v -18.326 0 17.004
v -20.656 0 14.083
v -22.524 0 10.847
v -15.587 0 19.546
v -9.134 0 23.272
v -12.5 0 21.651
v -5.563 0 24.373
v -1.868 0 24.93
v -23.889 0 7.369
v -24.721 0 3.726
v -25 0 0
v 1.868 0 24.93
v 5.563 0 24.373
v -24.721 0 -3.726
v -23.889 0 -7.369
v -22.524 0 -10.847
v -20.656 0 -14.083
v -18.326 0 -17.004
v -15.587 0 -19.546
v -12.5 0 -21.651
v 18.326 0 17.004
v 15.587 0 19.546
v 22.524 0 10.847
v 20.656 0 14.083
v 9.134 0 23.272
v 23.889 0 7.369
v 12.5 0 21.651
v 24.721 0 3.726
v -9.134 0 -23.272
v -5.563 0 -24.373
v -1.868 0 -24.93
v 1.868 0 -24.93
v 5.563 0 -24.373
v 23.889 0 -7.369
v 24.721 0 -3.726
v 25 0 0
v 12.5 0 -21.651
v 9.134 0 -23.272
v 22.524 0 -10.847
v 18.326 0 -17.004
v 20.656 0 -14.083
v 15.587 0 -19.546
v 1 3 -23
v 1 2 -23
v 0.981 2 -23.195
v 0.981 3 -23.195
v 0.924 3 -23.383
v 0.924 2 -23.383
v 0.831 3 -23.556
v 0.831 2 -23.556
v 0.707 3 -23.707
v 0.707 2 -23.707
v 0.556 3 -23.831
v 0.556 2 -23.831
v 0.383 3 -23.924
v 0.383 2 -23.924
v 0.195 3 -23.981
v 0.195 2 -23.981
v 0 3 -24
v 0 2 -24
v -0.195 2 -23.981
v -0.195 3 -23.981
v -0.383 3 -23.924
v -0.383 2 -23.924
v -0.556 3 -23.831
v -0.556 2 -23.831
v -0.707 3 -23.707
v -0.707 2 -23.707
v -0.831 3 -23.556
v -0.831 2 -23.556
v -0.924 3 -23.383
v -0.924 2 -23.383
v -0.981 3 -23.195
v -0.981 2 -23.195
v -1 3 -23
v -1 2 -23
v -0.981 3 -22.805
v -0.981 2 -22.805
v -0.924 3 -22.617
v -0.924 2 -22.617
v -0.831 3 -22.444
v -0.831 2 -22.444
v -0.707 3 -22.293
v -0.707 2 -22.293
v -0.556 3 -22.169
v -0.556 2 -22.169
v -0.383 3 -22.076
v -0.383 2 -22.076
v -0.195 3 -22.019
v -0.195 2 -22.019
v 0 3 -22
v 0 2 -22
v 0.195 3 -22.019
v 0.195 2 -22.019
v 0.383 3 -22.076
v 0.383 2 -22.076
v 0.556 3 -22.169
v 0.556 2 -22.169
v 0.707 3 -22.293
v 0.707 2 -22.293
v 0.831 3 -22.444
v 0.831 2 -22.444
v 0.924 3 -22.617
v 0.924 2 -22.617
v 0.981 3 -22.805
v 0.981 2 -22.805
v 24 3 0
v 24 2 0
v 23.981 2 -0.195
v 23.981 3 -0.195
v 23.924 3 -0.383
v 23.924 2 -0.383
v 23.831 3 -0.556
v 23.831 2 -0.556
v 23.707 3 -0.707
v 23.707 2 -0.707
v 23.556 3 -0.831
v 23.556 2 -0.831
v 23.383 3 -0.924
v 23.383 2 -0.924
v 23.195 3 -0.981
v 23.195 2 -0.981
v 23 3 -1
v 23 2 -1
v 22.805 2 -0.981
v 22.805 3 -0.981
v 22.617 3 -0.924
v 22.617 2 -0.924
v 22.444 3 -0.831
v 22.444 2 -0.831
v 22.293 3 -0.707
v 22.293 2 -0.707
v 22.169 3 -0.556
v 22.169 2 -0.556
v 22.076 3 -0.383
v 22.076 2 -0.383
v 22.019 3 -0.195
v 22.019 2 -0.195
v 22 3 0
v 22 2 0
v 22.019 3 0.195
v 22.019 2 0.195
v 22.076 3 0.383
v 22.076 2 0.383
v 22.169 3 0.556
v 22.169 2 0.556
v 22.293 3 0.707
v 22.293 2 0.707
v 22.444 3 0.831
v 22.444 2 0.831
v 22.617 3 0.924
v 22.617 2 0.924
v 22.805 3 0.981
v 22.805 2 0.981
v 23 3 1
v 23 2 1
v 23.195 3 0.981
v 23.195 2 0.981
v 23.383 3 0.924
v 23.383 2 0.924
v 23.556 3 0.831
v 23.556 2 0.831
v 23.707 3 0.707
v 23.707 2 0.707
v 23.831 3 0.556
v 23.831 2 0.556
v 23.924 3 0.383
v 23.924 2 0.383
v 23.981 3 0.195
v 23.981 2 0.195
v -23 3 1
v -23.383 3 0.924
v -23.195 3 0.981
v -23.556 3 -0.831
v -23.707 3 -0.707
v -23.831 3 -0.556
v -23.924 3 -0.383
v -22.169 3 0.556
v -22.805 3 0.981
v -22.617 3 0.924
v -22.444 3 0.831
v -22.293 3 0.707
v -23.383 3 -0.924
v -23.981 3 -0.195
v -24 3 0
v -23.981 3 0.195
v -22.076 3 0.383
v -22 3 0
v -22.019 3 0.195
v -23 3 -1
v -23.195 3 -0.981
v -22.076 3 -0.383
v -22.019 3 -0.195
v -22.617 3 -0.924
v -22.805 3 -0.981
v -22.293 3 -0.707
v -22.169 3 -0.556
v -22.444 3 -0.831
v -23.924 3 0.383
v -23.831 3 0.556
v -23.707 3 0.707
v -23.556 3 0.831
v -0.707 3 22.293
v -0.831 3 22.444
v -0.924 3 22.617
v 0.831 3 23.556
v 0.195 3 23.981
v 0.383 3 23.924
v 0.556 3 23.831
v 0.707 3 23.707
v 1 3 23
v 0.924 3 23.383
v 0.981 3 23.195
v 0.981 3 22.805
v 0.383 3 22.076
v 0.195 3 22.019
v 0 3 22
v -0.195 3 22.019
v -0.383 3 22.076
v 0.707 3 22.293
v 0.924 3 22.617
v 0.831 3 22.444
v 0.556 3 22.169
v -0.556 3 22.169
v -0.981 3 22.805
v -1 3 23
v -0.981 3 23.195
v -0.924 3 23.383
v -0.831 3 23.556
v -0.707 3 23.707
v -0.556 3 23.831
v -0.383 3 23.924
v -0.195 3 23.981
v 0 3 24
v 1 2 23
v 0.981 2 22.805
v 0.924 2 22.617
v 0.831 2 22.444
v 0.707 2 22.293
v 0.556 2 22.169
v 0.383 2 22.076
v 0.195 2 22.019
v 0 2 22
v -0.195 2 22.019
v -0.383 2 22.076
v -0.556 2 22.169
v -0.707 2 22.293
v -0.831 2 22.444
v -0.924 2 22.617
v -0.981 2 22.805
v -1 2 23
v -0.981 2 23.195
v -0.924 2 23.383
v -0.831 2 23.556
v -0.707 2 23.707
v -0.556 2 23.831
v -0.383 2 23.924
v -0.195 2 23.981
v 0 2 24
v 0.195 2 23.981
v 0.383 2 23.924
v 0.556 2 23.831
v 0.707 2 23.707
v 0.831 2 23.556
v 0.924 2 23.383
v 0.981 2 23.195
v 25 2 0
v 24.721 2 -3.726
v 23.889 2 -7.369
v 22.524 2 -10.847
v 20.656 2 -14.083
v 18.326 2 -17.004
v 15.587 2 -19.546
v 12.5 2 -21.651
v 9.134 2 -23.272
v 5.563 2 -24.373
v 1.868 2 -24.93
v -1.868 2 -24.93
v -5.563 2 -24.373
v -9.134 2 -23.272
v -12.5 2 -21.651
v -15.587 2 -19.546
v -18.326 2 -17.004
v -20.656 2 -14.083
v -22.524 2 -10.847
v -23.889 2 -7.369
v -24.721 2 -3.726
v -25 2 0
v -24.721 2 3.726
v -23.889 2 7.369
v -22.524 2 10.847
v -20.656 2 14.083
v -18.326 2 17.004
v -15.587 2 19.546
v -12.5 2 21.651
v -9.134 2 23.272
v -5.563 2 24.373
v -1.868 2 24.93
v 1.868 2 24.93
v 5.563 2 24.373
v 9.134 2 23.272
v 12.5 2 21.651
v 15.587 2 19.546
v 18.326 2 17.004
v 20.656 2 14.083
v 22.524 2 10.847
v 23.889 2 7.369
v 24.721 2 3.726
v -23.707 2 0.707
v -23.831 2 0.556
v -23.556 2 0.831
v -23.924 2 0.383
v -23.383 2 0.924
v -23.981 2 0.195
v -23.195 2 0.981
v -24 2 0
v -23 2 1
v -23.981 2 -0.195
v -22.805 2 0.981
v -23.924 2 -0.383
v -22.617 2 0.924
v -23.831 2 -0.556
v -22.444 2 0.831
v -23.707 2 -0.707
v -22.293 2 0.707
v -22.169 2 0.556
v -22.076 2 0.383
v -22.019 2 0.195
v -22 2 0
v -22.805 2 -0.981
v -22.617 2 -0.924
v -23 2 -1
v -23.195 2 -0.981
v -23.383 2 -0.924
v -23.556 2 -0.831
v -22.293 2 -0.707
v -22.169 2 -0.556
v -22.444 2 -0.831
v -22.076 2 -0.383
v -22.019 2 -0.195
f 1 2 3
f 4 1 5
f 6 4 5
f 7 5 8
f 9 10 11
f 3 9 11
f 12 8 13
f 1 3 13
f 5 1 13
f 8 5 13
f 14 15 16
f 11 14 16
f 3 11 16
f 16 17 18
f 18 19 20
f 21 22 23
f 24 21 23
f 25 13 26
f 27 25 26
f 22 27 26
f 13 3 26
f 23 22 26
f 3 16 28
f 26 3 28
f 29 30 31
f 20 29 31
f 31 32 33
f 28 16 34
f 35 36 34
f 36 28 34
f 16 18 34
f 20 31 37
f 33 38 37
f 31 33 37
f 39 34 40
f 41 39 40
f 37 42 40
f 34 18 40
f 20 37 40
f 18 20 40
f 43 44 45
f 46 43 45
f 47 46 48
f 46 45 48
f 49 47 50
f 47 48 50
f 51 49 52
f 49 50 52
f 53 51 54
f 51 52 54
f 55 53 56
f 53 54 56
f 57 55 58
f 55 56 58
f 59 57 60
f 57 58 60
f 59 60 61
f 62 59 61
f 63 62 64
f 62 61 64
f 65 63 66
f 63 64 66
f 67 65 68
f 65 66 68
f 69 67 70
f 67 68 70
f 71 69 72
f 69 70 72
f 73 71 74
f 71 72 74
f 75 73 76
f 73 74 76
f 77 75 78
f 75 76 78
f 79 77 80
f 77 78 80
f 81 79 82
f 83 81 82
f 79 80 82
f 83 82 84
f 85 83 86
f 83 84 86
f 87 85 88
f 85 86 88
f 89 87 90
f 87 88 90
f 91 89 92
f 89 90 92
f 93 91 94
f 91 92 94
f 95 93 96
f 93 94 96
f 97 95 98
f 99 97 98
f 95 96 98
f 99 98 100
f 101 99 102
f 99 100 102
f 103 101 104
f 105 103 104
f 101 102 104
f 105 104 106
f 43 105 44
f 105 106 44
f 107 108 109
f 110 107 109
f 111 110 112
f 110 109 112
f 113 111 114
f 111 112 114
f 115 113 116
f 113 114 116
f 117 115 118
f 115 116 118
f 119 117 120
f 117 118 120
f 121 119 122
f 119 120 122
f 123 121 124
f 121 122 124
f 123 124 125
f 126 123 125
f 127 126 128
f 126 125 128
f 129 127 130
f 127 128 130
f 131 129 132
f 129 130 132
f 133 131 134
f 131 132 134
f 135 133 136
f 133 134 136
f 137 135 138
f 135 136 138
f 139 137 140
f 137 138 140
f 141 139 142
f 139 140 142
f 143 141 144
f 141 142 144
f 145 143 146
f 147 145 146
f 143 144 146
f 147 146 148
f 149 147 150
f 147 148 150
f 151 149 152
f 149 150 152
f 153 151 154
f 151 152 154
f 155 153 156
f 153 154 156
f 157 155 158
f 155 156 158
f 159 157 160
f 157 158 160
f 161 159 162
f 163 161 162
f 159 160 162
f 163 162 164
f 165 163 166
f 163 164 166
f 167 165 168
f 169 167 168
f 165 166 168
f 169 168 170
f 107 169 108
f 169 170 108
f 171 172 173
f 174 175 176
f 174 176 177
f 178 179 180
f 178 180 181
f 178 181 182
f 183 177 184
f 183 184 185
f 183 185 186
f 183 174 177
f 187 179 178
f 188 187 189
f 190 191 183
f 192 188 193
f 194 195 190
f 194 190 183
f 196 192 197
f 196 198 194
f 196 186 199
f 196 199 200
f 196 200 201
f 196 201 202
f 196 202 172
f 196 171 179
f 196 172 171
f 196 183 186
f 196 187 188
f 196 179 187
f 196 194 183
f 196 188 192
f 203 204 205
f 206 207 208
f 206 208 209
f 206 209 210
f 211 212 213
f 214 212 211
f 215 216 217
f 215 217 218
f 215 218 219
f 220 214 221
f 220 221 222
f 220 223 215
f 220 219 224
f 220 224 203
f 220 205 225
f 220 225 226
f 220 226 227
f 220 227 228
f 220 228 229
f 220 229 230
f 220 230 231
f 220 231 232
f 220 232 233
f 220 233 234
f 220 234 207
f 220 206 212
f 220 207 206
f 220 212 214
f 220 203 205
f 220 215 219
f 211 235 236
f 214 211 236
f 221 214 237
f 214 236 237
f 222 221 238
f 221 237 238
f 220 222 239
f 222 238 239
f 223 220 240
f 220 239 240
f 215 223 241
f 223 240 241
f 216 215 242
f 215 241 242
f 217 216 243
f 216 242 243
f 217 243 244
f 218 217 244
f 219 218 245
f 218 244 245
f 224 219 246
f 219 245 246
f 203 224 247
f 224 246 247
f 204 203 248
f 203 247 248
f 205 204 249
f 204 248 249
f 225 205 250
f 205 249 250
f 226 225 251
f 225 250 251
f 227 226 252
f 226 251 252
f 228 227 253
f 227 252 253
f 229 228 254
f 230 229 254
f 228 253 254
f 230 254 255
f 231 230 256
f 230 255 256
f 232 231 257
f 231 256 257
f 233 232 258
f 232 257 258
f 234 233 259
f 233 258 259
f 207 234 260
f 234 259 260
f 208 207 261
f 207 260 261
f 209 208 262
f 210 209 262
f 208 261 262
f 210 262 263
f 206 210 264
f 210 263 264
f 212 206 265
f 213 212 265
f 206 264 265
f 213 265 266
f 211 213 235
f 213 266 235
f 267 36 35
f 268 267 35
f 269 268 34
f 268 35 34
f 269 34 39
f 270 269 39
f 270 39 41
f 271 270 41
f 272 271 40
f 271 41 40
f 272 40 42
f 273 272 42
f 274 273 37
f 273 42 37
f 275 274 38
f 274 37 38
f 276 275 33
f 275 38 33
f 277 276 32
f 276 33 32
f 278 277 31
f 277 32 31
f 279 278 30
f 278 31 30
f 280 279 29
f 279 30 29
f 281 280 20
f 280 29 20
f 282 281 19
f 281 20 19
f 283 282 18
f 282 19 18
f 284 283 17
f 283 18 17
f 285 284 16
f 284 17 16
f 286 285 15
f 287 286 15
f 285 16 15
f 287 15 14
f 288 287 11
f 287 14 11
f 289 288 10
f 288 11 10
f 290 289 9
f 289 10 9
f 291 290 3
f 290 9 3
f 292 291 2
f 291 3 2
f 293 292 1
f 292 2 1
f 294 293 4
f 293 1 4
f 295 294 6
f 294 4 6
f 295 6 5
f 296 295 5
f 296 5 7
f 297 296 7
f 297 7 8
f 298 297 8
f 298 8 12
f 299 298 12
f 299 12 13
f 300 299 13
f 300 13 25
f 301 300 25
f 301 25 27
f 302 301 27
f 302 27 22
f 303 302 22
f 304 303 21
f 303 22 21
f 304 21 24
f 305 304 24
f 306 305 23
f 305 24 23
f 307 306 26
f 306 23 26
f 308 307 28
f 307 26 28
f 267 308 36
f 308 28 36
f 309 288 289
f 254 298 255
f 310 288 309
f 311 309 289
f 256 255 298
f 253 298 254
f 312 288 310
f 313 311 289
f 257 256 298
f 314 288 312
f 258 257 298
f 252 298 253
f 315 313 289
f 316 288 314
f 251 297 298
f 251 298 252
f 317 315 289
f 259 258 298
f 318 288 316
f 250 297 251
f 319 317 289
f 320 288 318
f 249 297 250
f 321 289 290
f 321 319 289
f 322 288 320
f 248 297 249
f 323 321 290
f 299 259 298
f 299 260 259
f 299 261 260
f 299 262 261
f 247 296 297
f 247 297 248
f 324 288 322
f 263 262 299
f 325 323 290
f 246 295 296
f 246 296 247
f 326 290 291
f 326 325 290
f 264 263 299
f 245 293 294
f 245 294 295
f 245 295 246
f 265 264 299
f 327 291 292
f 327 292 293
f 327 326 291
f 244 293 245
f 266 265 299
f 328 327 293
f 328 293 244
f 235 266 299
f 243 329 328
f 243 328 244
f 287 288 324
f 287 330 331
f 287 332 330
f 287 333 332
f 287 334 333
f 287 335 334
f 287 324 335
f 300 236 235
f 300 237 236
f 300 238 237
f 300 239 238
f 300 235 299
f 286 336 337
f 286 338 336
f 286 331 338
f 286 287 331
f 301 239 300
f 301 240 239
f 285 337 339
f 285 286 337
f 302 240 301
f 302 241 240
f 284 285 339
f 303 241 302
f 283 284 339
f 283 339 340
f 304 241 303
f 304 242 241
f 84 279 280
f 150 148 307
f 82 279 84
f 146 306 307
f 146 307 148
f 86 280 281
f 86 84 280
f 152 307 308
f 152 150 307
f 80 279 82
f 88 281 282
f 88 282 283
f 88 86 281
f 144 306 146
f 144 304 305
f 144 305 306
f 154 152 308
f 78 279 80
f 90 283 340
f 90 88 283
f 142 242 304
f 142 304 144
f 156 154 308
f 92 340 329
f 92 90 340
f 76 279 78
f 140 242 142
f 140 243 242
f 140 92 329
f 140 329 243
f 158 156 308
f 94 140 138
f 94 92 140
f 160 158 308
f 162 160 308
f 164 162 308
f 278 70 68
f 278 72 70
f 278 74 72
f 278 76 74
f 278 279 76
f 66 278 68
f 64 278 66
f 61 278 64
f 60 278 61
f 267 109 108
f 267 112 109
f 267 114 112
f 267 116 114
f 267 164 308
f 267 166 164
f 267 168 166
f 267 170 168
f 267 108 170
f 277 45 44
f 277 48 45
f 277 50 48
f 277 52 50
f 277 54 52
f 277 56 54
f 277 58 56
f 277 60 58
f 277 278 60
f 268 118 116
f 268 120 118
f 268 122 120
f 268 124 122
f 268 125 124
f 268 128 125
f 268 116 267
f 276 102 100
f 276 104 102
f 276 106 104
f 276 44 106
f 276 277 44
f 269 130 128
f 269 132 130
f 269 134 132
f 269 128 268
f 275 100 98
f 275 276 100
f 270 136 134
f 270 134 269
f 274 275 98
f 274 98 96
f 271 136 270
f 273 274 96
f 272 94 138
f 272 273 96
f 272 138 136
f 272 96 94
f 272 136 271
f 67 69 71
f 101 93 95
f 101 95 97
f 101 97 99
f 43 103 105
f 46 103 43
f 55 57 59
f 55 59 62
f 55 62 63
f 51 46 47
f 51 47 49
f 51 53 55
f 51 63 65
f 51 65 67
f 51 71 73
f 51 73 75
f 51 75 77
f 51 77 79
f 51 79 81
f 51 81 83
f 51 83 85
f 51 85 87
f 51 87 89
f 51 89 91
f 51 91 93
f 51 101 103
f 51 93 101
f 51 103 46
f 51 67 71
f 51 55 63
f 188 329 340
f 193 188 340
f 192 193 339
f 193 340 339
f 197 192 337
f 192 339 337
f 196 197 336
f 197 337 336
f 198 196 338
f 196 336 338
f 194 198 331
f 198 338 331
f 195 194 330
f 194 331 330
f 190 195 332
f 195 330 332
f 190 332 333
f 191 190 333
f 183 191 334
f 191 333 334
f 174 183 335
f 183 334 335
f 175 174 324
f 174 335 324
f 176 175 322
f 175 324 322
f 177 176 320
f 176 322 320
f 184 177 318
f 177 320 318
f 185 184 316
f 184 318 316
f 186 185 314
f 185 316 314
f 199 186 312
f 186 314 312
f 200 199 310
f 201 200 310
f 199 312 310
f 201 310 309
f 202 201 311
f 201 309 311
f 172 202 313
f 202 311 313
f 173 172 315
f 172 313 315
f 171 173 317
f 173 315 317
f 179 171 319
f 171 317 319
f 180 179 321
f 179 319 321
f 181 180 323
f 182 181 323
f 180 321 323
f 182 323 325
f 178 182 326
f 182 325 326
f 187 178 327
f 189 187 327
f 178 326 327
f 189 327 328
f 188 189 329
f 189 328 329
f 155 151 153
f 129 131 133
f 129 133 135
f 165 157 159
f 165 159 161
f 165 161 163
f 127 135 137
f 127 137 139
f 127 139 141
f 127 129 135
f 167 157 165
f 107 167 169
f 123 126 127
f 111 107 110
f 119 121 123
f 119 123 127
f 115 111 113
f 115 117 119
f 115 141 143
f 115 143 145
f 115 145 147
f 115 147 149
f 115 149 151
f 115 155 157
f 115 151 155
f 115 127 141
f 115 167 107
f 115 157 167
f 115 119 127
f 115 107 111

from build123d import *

# Parameters (mm, degrees)
SKETCH1_R           = 25
BOSS_EXTRUDE1_DEPTH = 2
SKETCH2_R           = 1
BOSS_EXTRUDE2_DEPTH = 1


with BuildPart() as part:
    # Sketch1 → Boss-Extrude1 (new body)
    with BuildSketch(Plane(origin=(0, 0, 0), x_dir=(1, 0, 0), z_dir=(0, 1, 0))):
        Circle(SKETCH1_R)
    extrude(amount=BOSS_EXTRUDE1_DEPTH)

    # Sketch2 → Boss-Extrude2 (add)
    with BuildSketch(Plane(origin=(0, 2, 0), x_dir=(1, 0, 0), z_dir=(0, 1, 0))):
        with Locations((0, 23)):
            Circle(SKETCH2_R)
        with Locations((23, 0)):
            Circle(SKETCH2_R)
        with Locations((0, -23)):
            Circle(SKETCH2_R)
        with Locations((-23, 0)):
            Circle(SKETCH2_R)
    extrude(amount=BOSS_EXTRUDE2_DEPTH)


solid = part.part
